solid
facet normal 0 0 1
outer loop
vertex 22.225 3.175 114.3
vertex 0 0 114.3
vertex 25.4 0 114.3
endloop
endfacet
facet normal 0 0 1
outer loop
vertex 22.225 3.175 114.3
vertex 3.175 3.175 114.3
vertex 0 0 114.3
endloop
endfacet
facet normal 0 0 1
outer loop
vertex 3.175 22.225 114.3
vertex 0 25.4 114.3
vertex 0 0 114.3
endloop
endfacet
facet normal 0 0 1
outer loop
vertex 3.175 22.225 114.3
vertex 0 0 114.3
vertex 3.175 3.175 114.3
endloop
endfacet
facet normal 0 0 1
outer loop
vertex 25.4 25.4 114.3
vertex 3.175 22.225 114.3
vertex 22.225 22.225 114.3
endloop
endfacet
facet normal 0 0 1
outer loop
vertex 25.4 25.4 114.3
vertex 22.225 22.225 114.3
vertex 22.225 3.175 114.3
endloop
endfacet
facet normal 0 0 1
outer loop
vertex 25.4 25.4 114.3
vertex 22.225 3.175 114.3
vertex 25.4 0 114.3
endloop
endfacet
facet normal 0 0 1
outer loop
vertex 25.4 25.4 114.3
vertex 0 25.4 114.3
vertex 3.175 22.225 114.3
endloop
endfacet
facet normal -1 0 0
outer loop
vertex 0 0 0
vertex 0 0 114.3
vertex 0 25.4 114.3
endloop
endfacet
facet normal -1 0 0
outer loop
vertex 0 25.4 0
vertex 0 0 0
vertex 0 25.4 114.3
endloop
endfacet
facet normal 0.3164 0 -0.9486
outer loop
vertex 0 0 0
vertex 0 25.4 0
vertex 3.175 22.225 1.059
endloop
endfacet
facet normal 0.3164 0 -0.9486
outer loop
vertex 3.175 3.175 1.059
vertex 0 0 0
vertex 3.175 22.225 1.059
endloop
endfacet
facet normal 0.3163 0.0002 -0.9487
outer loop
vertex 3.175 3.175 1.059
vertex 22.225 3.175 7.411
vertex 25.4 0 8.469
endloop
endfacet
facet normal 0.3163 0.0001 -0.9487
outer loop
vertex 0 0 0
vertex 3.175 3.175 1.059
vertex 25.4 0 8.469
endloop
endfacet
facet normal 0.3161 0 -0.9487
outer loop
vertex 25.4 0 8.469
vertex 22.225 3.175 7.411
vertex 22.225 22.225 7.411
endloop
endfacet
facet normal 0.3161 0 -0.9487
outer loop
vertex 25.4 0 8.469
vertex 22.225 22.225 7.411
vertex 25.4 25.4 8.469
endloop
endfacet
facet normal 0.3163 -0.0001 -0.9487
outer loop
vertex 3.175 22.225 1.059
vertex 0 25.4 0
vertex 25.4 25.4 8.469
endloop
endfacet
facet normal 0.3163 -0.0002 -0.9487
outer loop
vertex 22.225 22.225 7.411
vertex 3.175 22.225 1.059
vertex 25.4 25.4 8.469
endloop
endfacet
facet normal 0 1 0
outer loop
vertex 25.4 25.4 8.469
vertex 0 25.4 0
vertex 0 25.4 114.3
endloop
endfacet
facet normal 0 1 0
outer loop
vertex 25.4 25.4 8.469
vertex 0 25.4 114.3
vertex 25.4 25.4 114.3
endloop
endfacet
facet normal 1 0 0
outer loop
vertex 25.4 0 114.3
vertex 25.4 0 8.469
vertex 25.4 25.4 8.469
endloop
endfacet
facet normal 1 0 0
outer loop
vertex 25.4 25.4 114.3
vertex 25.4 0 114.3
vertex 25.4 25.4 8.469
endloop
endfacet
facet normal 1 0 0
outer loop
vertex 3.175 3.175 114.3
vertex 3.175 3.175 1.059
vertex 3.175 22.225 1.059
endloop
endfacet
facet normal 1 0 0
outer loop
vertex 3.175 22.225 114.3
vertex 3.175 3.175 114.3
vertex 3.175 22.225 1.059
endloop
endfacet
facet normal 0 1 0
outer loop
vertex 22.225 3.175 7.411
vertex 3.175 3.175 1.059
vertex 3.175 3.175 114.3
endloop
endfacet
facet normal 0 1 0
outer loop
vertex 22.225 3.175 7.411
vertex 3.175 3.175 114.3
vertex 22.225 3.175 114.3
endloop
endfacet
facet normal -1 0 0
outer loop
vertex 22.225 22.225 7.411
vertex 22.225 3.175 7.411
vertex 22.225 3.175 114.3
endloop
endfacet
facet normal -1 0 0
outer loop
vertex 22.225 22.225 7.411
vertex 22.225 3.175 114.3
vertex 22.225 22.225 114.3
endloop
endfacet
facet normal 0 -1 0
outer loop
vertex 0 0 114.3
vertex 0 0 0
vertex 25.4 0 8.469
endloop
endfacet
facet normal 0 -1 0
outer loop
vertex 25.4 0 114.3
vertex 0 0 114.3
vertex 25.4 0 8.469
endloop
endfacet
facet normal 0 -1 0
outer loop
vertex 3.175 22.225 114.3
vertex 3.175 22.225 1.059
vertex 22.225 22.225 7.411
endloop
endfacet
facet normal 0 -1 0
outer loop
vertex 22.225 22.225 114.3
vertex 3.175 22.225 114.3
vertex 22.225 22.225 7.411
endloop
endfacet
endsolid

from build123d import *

# Parameters (mm, degrees)
SKETCH1_W           = 25.4
SKETCH1_H           = 25.4
SKETCH1_W_2         = 19.05
SKETCH1_H_2         = 19.05
BOSS_EXTRUDE1_DEPTH = 114.3
CUT_EXTRUDE1_DEPTH  = 120.811560377


with BuildPart() as part:
    # Sketch1 → Boss-Extrude1 (new body)
    with BuildSketch(Plane.XY):
        with Locations((12.7, 12.7)):
            Rectangle(SKETCH1_W, SKETCH1_H)
        with Locations((12.7, 12.7)):
            Rectangle(SKETCH1_W_2, SKETCH1_H_2, mode=Mode.SUBTRACT)
    extrude(amount=BOSS_EXTRUDE1_DEPTH)

    # Sketch2 → Cut-Extrude1 (cut, through all)
    with BuildSketch(Plane(origin=(0, 25.4, 0), x_dir=(1, 0, 0), z_dir=(0, 1, 0))):
        Polygon((0, 0), (25.4, -8.469154802), (25.4, 0), align=None)
    extrude(amount=-CUT_EXTRUDE1_DEPTH, mode=Mode.SUBTRACT)


solid = part.part
